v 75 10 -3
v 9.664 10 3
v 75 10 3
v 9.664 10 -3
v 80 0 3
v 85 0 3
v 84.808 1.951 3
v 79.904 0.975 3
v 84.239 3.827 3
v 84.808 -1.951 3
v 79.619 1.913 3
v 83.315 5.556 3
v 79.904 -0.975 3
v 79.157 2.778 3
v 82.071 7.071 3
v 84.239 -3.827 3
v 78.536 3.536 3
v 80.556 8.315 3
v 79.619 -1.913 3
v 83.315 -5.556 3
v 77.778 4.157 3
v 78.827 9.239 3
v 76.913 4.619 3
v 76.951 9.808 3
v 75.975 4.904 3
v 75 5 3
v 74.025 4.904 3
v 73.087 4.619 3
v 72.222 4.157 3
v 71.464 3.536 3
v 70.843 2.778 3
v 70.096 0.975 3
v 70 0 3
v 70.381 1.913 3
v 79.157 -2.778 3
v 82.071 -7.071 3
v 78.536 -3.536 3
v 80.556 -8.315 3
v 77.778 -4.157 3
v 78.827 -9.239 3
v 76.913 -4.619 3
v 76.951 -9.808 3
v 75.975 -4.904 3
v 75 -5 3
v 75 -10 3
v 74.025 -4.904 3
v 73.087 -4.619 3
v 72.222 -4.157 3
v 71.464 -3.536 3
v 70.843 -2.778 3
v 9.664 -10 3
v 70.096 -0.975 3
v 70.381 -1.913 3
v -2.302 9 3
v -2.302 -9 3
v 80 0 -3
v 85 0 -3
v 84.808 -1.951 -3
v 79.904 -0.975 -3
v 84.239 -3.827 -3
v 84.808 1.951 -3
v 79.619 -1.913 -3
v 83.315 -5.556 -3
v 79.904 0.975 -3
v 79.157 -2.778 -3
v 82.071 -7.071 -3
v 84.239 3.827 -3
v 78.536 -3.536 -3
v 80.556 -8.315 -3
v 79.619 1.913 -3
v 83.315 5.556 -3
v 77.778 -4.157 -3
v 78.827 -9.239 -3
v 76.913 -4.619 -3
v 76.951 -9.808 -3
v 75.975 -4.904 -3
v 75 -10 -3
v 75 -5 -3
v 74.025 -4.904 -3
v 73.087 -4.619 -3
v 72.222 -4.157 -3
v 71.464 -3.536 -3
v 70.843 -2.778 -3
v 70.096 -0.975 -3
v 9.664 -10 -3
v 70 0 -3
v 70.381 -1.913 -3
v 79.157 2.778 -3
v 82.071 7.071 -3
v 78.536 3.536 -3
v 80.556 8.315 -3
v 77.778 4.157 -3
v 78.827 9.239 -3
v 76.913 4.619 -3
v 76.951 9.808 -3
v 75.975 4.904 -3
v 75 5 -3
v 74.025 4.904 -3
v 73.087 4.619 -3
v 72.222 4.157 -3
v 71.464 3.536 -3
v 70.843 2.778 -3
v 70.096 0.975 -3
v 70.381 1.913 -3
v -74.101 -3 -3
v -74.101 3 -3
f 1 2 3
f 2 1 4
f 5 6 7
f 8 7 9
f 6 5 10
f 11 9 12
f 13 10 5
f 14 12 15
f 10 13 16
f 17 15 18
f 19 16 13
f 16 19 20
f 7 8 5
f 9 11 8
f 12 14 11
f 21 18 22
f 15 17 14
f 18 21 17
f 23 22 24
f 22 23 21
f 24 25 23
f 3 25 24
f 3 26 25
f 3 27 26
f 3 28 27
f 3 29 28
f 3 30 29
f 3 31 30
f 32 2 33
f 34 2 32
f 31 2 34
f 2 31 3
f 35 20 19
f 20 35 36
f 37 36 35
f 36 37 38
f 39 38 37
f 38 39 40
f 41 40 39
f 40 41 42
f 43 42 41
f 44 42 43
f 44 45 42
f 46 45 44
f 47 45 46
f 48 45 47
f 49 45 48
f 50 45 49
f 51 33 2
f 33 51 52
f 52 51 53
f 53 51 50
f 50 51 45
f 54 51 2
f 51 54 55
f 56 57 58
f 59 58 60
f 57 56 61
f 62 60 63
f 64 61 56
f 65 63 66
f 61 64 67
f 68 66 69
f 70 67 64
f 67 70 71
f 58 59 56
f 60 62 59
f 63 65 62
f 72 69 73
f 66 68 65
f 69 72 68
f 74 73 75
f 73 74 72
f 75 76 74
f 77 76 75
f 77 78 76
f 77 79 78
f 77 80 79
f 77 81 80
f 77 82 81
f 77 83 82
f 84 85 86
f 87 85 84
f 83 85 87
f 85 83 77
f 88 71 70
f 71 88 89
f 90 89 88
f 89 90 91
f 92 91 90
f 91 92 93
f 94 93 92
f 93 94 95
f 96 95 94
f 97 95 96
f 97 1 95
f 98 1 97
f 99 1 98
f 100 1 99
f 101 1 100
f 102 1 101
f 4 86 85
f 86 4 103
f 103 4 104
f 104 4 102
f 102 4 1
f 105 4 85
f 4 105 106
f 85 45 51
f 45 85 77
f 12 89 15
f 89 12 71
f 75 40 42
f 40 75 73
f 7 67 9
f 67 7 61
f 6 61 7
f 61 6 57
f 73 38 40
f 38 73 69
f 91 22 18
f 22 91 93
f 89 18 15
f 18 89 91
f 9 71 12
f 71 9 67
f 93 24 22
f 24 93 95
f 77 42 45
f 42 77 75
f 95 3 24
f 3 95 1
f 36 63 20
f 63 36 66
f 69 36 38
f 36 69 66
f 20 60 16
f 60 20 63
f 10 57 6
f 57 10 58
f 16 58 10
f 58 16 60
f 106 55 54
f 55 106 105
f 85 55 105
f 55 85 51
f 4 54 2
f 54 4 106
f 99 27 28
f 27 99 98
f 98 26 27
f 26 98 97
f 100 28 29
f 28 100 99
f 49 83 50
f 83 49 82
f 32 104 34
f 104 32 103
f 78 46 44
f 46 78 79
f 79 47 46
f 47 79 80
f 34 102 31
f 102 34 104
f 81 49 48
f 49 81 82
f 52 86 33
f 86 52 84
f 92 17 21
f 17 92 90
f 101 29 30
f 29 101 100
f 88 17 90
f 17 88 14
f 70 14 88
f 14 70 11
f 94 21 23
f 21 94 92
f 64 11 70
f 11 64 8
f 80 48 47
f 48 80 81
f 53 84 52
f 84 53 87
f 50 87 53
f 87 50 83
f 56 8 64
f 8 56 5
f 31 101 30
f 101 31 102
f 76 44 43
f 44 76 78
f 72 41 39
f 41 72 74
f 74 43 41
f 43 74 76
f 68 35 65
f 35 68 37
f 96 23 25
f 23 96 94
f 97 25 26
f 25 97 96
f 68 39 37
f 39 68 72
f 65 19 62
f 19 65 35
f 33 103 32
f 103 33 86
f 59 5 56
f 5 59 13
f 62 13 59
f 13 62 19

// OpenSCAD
// [FL_INDEX: keywords="openscad, 3d_parametric, Customizable_panel_pry_tool, csg_solid" | COT="Parametric OpenSCAD design from 3DCodeverse"]
// Title: Customizable panel pry tool

// ===== file: car_panel_pry_tool.scad =====
//Customizable panel pry tool
//Alex Tanchoco (LionAlex)
//Dec 14,2013

handle_length = 200;
handle_width = 20;
handle_thickness = 6;

rotate( [0,0,90] ) 
{
	difference() {
	intersection() {


		translate( [0,0,-handle_thickness] )
			rotate( [90,0,0] )
				rotate( [0,0,45] )
					cylinder( h=handle_length+handle_width, r2=handle_width+handle_thickness, r1=0, $fn=4, center=true );
			base_shape();

		}
		translate( [0,-handle_length*0.375,0] )
				cylinder( h=handle_thickness, r=handle_width/4, $fn=32, center=true );
	}
}

module base_shape() {
			cube( [handle_width,handle_length*0.75,handle_thickness],center=true );
			translate( [0,-handle_length*0.375,0] )
				cylinder( h=handle_thickness, r=handle_width/2, $fn=32, center=true );
		}

// ===== file: customizable_panel_pry_tool.scad =====
//Customizable panel pry tool
//Alex Tanchoco (LionAlex)
//Dec 14,2013

handle_length = 200;
handle_width = 20;
handle_thickness = 6;

rotate( [0,0,90] ) 
{
	difference() {
	intersection() {


		translate( [0,0,-handle_thickness] )
			rotate( [90,0,0] )
				rotate( [0,0,45] )
					cylinder( h=handle_length+handle_width, r2=handle_width+handle_thickness, r1=0, $fn=4, center=true );
			base_shape();

		}
		translate( [0,-handle_length*0.375,0] )
				cylinder( h=handle_thickness, r=handle_width/4, $fn=32, center=true );
	}
}

module base_shape() {
			cube( [handle_width,handle_length*0.75,handle_thickness],center=true );
			translate( [0,-handle_length*0.375,0] )
				cylinder( h=handle_thickness, r=handle_width/2, $fn=32, center=true );
		}
